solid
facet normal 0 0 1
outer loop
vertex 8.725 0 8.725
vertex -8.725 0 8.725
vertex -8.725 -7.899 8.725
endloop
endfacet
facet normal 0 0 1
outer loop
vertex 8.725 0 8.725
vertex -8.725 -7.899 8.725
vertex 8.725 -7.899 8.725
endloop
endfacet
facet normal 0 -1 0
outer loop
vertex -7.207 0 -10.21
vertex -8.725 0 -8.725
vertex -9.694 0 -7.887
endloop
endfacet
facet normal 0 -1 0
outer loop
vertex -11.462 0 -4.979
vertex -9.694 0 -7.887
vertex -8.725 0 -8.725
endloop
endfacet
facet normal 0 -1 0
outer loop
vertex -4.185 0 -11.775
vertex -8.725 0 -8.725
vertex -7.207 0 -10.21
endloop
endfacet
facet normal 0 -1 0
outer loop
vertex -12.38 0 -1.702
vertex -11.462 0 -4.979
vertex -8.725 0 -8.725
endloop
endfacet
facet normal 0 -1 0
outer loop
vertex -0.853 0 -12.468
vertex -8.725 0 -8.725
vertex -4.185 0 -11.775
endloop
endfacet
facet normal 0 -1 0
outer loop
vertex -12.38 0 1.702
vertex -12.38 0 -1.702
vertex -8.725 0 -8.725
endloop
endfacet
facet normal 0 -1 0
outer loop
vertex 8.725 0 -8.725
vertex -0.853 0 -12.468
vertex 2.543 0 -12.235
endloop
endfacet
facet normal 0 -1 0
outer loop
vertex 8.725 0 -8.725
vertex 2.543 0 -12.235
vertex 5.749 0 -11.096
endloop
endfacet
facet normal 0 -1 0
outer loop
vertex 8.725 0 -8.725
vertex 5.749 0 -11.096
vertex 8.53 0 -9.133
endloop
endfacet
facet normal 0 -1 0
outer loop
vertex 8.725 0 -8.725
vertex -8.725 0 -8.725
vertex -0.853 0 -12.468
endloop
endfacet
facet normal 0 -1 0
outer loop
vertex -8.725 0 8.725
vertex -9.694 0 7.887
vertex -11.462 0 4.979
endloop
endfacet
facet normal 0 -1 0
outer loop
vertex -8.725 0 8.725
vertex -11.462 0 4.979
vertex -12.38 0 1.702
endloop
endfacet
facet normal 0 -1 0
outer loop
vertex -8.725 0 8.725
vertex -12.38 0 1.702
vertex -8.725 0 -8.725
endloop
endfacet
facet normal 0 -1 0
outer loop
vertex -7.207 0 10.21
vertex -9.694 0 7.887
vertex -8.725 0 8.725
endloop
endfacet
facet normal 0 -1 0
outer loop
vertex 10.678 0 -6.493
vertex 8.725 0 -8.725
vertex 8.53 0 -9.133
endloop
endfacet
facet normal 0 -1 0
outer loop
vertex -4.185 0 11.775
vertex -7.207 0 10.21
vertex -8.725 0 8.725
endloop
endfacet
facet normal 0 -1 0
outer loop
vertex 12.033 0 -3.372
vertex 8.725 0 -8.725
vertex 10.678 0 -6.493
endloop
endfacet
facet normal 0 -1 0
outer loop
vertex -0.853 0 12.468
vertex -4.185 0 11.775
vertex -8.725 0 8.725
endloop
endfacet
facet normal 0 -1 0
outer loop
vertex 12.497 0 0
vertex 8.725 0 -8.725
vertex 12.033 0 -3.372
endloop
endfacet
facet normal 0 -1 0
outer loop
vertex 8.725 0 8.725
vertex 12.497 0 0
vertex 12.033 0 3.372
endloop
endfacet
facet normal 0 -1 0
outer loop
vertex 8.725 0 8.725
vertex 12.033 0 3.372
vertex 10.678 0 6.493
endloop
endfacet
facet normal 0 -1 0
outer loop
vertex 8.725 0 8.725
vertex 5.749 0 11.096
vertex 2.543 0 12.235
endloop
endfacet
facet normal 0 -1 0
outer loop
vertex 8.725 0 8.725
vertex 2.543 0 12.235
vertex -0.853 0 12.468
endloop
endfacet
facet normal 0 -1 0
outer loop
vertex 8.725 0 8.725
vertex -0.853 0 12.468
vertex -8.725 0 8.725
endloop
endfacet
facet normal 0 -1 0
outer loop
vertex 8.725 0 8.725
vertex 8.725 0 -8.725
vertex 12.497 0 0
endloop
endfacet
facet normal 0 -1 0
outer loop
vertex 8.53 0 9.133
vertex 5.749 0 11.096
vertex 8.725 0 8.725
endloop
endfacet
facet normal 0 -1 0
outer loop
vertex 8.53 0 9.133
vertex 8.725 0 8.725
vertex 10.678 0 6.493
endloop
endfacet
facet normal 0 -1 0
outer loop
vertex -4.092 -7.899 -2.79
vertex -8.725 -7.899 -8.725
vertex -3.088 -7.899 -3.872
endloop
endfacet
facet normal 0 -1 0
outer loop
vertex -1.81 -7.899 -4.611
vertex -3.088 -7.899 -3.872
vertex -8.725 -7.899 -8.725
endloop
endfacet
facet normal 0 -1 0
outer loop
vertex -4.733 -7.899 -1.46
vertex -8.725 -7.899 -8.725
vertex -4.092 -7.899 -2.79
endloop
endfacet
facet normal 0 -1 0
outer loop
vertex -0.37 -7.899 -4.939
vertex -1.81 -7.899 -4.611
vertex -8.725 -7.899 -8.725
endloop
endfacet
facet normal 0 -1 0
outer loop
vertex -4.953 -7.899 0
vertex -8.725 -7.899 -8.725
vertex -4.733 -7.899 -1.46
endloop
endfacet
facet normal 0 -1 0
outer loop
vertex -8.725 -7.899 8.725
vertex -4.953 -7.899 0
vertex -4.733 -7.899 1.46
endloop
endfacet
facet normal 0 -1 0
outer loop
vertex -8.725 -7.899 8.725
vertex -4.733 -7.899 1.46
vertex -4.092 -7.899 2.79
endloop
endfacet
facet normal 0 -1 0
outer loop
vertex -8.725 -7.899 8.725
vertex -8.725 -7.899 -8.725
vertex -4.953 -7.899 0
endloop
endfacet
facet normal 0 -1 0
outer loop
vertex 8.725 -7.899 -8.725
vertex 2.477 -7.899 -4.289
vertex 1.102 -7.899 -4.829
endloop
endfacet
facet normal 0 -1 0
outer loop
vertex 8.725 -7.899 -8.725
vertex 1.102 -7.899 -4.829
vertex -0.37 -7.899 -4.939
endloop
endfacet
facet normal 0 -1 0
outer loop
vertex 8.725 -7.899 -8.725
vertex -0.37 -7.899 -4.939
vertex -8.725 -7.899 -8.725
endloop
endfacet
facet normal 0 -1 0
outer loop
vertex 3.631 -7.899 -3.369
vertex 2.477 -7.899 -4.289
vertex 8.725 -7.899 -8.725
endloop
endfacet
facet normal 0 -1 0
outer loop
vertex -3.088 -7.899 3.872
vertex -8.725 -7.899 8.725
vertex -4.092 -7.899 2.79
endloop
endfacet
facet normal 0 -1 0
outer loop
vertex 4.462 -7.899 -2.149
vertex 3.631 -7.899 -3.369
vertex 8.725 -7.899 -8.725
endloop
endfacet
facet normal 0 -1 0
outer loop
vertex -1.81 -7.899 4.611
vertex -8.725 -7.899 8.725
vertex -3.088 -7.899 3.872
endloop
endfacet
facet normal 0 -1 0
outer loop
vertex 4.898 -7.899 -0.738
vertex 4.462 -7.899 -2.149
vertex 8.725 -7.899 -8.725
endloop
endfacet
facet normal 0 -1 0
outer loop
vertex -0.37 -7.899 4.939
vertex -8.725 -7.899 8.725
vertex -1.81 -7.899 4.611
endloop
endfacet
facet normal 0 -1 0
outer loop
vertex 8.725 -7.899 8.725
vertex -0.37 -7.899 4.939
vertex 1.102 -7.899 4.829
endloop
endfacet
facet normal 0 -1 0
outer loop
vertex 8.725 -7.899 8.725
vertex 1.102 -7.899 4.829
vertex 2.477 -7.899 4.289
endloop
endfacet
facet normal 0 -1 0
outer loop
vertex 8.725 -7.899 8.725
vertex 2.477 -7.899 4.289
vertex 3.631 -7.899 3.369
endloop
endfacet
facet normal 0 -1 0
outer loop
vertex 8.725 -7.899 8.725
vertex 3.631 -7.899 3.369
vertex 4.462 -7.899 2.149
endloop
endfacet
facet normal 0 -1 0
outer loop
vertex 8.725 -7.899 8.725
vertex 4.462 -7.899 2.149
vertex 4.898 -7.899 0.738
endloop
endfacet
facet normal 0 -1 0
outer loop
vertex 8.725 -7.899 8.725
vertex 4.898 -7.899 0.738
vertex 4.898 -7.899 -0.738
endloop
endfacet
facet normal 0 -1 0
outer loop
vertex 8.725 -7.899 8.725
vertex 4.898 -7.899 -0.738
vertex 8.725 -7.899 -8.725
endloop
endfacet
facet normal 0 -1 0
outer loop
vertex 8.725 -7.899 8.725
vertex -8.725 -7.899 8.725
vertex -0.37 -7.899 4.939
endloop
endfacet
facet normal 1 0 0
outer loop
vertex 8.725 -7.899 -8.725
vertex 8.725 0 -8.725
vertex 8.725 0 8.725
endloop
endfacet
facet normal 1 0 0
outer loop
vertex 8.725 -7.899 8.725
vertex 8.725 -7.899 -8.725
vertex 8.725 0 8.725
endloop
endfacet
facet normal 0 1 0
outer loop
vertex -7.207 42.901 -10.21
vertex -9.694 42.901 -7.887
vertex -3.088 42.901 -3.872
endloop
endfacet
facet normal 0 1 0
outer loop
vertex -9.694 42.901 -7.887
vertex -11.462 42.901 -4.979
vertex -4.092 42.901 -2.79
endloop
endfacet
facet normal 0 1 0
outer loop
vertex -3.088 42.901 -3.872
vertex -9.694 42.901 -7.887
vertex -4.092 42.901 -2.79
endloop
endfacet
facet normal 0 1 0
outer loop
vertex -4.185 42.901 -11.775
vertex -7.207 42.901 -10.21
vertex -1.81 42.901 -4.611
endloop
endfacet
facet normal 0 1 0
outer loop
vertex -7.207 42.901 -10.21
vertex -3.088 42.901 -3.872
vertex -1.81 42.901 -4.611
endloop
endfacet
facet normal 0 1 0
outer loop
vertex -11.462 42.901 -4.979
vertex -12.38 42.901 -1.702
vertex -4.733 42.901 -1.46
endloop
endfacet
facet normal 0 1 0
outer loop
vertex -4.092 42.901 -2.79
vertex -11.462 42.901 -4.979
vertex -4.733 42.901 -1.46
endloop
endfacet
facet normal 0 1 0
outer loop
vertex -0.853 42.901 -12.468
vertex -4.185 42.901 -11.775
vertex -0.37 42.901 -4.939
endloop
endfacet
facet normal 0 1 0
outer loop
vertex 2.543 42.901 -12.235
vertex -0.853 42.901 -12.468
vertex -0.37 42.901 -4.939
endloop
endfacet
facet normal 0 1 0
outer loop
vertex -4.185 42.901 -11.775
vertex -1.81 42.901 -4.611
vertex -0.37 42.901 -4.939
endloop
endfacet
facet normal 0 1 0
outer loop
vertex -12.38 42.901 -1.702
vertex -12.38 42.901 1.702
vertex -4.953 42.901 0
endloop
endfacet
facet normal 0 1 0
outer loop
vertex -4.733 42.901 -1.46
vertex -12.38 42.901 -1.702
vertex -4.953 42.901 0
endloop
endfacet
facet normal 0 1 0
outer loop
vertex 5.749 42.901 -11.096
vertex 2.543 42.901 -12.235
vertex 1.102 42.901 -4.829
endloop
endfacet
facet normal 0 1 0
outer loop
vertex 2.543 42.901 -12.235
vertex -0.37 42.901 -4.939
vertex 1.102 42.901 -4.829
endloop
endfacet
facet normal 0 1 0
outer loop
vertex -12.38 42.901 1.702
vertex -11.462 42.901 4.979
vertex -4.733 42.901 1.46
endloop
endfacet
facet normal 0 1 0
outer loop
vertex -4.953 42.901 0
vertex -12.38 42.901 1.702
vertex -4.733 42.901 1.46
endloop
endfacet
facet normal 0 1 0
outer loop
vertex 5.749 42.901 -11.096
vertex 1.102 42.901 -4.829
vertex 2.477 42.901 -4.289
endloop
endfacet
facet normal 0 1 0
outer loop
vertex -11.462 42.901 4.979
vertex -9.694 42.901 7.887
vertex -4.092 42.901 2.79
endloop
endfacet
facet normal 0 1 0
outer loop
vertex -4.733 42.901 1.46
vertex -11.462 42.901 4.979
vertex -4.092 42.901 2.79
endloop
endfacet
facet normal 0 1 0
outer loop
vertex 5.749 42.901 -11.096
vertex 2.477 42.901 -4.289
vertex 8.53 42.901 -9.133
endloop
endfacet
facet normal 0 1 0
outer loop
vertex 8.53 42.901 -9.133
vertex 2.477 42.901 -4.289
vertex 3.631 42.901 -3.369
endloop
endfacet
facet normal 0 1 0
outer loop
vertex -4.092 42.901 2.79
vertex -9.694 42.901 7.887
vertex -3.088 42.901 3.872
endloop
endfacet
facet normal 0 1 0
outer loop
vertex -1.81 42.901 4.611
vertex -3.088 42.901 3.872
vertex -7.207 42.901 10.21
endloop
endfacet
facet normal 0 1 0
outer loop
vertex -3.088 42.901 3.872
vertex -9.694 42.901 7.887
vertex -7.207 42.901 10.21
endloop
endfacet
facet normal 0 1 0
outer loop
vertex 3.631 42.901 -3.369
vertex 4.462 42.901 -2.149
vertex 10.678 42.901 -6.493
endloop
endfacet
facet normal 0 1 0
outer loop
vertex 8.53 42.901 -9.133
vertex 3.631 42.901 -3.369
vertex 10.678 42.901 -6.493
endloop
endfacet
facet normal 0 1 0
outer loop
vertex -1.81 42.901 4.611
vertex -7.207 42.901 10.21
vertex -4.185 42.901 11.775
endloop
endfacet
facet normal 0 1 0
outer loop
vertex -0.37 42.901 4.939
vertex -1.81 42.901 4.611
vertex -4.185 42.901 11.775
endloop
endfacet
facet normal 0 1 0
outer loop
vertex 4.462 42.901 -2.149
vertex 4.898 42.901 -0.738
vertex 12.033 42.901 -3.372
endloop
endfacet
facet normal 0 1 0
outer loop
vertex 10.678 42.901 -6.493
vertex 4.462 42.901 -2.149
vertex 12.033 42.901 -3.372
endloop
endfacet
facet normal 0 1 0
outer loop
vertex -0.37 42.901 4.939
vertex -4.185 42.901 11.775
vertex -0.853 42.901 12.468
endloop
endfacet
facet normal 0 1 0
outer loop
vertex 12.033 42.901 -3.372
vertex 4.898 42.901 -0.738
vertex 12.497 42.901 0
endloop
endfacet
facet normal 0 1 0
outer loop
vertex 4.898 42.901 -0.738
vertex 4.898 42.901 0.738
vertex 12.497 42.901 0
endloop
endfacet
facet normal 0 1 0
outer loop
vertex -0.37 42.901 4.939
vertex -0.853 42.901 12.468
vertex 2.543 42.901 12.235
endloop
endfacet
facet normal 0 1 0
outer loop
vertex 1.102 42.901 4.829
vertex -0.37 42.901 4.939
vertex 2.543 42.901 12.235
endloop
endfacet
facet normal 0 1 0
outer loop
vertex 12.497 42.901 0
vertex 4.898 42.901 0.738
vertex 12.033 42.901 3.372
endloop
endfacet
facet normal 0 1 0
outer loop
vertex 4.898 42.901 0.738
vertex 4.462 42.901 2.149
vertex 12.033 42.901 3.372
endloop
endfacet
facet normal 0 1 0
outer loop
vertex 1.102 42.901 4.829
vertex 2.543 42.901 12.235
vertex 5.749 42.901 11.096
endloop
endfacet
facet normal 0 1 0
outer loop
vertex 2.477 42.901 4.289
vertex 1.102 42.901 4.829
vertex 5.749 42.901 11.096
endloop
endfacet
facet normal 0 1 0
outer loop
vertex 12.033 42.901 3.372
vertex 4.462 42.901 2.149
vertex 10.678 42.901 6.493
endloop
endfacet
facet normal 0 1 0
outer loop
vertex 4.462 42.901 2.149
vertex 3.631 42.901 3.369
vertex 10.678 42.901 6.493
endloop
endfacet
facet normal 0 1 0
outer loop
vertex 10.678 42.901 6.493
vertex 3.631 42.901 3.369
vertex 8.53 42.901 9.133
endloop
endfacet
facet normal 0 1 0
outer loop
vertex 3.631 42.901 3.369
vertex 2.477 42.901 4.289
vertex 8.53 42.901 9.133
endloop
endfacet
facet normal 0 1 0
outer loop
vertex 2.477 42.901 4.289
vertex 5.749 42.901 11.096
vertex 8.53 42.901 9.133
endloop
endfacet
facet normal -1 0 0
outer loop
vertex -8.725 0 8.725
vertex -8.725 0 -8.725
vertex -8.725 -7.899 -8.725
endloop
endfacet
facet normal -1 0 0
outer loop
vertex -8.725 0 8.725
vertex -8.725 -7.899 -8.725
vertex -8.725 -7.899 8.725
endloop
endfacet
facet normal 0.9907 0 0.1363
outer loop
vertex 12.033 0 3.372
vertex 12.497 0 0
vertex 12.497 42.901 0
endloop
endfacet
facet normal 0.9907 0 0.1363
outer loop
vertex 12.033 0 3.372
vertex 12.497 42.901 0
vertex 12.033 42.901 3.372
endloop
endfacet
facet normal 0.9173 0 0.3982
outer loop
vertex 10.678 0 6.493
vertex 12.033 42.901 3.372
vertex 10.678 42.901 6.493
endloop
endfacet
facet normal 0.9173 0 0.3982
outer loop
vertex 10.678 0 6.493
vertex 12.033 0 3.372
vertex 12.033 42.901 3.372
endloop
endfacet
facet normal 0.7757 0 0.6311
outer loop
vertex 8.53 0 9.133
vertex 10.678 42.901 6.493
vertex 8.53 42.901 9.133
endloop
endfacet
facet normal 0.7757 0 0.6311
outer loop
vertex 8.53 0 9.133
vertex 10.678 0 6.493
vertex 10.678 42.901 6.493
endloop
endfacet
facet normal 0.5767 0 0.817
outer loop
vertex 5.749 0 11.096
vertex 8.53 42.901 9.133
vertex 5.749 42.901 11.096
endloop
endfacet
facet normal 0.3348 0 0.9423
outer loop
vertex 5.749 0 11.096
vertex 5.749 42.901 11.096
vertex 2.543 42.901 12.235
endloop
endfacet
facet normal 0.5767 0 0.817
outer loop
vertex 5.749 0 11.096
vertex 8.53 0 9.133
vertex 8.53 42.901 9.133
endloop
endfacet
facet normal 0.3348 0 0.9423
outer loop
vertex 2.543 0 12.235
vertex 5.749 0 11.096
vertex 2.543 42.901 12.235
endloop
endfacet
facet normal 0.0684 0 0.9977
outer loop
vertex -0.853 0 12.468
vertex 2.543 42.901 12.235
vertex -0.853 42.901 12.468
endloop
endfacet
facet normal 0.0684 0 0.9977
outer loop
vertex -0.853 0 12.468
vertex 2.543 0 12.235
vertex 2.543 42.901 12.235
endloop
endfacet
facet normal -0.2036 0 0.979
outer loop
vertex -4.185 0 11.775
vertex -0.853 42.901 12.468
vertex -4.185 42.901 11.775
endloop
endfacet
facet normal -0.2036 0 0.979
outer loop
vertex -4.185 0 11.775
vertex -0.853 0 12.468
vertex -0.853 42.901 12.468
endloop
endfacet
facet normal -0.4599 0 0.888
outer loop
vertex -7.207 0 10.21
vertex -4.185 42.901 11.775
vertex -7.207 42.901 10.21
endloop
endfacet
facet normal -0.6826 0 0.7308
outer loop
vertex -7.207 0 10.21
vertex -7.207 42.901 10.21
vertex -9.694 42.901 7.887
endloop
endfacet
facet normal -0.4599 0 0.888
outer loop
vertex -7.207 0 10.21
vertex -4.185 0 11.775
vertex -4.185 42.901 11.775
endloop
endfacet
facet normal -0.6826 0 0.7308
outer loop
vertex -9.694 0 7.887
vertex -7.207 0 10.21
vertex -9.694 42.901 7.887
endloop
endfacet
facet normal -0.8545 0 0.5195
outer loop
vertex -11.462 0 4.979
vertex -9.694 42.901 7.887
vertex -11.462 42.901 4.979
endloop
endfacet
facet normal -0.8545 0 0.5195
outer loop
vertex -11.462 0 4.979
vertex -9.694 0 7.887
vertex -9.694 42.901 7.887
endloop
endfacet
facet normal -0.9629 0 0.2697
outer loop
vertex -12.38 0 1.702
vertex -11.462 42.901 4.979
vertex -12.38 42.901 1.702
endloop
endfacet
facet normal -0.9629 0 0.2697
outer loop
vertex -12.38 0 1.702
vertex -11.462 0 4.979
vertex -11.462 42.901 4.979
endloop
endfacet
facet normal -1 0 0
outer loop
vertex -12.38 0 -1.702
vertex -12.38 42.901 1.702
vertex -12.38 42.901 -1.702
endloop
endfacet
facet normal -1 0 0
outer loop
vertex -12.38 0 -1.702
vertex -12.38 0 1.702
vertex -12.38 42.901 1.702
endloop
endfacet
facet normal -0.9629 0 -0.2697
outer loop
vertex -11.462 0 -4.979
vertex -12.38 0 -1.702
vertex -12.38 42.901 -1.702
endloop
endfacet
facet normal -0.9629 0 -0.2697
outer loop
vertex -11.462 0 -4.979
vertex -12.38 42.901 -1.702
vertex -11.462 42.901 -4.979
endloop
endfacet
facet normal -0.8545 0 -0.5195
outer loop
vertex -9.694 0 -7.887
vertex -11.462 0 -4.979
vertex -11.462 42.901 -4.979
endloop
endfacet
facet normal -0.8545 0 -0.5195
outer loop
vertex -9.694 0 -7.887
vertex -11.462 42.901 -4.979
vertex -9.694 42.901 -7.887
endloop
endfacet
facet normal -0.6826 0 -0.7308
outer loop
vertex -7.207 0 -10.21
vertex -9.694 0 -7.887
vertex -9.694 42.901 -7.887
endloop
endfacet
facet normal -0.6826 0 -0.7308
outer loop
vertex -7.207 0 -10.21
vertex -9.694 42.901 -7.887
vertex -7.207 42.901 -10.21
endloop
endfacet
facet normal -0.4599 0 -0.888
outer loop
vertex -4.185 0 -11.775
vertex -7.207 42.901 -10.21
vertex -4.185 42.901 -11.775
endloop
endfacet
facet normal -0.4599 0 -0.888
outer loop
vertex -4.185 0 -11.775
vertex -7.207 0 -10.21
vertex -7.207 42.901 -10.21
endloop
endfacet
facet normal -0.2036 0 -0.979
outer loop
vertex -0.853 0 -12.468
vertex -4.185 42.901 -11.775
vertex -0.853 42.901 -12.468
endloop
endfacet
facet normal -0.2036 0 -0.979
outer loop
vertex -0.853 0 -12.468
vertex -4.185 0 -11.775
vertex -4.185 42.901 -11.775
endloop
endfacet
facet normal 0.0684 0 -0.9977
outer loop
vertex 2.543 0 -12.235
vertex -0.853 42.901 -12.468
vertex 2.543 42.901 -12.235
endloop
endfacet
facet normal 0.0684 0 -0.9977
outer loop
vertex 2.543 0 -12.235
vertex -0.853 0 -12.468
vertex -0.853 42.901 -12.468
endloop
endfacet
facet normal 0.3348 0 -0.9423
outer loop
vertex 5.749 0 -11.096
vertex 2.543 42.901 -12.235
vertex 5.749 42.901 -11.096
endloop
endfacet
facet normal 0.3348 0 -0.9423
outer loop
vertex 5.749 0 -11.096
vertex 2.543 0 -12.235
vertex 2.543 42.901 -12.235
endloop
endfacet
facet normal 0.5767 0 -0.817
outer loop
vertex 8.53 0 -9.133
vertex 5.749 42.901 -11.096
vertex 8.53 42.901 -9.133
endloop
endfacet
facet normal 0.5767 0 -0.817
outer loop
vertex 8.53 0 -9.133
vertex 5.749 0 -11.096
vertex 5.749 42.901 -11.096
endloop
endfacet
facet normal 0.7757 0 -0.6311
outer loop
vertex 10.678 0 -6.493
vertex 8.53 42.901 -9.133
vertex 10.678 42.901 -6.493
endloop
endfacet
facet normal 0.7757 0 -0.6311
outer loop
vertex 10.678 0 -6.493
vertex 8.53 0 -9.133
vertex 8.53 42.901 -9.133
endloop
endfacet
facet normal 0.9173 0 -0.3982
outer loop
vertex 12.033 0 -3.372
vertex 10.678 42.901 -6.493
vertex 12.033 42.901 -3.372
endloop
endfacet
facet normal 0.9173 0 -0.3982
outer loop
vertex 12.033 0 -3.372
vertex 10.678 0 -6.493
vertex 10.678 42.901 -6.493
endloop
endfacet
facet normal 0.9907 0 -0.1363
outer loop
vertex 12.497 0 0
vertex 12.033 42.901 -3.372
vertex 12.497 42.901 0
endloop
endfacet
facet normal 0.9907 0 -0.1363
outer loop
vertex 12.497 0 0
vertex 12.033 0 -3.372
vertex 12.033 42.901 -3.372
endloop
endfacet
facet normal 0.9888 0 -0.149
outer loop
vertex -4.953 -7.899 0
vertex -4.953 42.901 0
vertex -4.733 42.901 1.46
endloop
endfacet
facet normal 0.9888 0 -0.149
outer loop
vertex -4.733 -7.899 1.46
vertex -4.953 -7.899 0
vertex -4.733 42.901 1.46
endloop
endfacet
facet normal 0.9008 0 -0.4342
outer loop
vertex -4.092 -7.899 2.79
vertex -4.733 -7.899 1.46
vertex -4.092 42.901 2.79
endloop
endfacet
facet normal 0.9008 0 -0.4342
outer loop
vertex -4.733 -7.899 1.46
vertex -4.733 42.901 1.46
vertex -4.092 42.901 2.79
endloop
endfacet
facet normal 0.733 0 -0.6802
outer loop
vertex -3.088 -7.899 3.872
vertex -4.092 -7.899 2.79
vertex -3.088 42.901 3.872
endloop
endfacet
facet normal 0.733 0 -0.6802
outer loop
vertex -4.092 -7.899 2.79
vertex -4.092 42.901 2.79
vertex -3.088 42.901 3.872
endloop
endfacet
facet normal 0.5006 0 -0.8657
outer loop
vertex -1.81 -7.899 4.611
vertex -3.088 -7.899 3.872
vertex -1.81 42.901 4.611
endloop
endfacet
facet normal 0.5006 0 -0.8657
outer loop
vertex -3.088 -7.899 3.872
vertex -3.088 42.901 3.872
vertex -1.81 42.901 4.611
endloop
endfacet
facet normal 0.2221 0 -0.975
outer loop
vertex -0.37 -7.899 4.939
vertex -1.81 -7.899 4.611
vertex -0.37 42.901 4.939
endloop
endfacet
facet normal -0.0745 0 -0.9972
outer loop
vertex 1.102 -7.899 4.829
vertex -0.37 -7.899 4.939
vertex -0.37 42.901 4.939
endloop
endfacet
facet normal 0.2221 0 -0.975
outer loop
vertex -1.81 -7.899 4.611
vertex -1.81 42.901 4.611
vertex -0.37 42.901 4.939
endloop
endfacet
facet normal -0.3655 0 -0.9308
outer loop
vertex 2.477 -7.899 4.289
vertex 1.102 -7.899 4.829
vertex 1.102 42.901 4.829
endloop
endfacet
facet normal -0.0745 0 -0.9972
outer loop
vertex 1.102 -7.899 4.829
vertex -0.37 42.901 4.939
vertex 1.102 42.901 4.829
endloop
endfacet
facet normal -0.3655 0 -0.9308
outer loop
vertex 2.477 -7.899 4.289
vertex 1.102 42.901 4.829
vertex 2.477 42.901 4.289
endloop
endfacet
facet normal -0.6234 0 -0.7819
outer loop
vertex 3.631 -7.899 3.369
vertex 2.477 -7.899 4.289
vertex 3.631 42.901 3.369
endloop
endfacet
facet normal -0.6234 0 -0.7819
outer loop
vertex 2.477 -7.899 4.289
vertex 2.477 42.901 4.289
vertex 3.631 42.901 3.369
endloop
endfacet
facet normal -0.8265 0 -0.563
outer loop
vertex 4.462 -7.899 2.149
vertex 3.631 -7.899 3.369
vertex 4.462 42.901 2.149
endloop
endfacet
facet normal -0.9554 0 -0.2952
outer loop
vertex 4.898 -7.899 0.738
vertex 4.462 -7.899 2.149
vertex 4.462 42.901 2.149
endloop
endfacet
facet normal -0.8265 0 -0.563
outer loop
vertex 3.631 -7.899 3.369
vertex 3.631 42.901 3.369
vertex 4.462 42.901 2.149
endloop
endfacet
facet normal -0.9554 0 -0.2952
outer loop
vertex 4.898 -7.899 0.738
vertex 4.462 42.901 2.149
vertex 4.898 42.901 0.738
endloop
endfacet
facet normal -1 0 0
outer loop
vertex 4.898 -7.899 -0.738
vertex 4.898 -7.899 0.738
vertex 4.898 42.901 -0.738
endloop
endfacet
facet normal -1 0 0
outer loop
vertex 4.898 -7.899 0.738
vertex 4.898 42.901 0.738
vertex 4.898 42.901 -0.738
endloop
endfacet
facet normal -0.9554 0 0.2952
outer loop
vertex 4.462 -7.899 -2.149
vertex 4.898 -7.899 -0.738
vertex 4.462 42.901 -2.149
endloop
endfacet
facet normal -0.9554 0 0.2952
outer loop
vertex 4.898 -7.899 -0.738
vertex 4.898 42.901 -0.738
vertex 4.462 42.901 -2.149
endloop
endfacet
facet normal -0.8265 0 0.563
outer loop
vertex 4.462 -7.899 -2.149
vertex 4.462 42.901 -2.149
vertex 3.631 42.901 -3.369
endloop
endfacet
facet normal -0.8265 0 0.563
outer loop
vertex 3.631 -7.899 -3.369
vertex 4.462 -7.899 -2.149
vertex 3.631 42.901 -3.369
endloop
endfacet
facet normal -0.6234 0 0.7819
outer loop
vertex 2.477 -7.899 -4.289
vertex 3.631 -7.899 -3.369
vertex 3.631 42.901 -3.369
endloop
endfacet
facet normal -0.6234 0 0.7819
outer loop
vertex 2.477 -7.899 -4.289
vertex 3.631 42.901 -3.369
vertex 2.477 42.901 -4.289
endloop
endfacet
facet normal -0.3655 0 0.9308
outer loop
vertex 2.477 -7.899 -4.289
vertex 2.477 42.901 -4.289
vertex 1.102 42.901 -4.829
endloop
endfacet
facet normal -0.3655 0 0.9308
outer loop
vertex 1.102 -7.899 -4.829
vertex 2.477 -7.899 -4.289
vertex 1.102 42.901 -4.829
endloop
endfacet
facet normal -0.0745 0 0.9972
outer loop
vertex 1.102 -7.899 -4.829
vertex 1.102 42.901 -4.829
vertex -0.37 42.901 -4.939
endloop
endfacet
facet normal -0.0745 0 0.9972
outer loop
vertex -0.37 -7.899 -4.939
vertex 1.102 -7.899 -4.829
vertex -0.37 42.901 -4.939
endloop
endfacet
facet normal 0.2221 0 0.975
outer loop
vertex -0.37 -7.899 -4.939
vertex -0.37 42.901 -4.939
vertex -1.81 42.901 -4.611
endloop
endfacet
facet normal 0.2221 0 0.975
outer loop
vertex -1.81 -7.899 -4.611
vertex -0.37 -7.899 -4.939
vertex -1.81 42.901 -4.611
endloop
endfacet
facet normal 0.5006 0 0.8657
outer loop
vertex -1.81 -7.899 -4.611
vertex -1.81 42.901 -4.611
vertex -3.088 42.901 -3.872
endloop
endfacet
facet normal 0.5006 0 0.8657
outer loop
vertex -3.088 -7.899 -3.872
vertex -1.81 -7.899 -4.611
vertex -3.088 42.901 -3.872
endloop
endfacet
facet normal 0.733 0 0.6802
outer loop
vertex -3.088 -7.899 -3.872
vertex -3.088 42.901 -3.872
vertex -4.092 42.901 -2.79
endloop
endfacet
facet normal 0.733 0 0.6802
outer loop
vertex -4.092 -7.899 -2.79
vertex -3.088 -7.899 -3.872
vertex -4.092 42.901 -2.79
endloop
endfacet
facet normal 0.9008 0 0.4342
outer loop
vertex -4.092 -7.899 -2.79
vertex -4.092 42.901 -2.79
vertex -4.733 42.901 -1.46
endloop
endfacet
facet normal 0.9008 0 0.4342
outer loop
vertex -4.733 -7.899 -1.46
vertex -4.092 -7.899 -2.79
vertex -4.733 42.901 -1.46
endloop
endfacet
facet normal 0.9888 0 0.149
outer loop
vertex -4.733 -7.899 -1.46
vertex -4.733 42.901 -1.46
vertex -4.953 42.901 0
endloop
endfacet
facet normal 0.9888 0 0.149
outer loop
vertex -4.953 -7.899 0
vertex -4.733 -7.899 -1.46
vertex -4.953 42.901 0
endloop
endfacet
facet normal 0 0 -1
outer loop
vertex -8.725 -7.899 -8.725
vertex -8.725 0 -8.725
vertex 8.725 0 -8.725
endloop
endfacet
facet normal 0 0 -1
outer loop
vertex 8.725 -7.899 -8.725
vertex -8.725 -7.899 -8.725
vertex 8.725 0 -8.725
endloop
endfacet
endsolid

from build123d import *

# Parameters (mm, degrees)
F0_R     = 12.4968
F2_DEPTH = 42.9006
F1_W     = 17.4498
F1_H     = 17.4498
F3_DEPTH = 7.8994
F4_R     = 4.953
F5_DEPTH = 76.2


with BuildPart() as f2:
    # F0 (on Front) → F2 (new body)
    with BuildSketch(Plane.XZ):
        Circle(F0_R)
    extrude(amount=-F2_DEPTH)

    # F1 (on face) → F3 (join)
    with BuildSketch(Plane.XZ):
        Rectangle(F1_W, F1_H)
    extrude(amount=F3_DEPTH)

    # F4 (on face) → F5 (cut)
    with BuildSketch(Plane(origin=(0, 42.9006, 0), x_dir=(-1, 0, 0), z_dir=(0, 1, 0))):
        Circle(F4_R)
    extrude(amount=-F5_DEPTH, mode=Mode.SUBTRACT)


solid = f2.part
